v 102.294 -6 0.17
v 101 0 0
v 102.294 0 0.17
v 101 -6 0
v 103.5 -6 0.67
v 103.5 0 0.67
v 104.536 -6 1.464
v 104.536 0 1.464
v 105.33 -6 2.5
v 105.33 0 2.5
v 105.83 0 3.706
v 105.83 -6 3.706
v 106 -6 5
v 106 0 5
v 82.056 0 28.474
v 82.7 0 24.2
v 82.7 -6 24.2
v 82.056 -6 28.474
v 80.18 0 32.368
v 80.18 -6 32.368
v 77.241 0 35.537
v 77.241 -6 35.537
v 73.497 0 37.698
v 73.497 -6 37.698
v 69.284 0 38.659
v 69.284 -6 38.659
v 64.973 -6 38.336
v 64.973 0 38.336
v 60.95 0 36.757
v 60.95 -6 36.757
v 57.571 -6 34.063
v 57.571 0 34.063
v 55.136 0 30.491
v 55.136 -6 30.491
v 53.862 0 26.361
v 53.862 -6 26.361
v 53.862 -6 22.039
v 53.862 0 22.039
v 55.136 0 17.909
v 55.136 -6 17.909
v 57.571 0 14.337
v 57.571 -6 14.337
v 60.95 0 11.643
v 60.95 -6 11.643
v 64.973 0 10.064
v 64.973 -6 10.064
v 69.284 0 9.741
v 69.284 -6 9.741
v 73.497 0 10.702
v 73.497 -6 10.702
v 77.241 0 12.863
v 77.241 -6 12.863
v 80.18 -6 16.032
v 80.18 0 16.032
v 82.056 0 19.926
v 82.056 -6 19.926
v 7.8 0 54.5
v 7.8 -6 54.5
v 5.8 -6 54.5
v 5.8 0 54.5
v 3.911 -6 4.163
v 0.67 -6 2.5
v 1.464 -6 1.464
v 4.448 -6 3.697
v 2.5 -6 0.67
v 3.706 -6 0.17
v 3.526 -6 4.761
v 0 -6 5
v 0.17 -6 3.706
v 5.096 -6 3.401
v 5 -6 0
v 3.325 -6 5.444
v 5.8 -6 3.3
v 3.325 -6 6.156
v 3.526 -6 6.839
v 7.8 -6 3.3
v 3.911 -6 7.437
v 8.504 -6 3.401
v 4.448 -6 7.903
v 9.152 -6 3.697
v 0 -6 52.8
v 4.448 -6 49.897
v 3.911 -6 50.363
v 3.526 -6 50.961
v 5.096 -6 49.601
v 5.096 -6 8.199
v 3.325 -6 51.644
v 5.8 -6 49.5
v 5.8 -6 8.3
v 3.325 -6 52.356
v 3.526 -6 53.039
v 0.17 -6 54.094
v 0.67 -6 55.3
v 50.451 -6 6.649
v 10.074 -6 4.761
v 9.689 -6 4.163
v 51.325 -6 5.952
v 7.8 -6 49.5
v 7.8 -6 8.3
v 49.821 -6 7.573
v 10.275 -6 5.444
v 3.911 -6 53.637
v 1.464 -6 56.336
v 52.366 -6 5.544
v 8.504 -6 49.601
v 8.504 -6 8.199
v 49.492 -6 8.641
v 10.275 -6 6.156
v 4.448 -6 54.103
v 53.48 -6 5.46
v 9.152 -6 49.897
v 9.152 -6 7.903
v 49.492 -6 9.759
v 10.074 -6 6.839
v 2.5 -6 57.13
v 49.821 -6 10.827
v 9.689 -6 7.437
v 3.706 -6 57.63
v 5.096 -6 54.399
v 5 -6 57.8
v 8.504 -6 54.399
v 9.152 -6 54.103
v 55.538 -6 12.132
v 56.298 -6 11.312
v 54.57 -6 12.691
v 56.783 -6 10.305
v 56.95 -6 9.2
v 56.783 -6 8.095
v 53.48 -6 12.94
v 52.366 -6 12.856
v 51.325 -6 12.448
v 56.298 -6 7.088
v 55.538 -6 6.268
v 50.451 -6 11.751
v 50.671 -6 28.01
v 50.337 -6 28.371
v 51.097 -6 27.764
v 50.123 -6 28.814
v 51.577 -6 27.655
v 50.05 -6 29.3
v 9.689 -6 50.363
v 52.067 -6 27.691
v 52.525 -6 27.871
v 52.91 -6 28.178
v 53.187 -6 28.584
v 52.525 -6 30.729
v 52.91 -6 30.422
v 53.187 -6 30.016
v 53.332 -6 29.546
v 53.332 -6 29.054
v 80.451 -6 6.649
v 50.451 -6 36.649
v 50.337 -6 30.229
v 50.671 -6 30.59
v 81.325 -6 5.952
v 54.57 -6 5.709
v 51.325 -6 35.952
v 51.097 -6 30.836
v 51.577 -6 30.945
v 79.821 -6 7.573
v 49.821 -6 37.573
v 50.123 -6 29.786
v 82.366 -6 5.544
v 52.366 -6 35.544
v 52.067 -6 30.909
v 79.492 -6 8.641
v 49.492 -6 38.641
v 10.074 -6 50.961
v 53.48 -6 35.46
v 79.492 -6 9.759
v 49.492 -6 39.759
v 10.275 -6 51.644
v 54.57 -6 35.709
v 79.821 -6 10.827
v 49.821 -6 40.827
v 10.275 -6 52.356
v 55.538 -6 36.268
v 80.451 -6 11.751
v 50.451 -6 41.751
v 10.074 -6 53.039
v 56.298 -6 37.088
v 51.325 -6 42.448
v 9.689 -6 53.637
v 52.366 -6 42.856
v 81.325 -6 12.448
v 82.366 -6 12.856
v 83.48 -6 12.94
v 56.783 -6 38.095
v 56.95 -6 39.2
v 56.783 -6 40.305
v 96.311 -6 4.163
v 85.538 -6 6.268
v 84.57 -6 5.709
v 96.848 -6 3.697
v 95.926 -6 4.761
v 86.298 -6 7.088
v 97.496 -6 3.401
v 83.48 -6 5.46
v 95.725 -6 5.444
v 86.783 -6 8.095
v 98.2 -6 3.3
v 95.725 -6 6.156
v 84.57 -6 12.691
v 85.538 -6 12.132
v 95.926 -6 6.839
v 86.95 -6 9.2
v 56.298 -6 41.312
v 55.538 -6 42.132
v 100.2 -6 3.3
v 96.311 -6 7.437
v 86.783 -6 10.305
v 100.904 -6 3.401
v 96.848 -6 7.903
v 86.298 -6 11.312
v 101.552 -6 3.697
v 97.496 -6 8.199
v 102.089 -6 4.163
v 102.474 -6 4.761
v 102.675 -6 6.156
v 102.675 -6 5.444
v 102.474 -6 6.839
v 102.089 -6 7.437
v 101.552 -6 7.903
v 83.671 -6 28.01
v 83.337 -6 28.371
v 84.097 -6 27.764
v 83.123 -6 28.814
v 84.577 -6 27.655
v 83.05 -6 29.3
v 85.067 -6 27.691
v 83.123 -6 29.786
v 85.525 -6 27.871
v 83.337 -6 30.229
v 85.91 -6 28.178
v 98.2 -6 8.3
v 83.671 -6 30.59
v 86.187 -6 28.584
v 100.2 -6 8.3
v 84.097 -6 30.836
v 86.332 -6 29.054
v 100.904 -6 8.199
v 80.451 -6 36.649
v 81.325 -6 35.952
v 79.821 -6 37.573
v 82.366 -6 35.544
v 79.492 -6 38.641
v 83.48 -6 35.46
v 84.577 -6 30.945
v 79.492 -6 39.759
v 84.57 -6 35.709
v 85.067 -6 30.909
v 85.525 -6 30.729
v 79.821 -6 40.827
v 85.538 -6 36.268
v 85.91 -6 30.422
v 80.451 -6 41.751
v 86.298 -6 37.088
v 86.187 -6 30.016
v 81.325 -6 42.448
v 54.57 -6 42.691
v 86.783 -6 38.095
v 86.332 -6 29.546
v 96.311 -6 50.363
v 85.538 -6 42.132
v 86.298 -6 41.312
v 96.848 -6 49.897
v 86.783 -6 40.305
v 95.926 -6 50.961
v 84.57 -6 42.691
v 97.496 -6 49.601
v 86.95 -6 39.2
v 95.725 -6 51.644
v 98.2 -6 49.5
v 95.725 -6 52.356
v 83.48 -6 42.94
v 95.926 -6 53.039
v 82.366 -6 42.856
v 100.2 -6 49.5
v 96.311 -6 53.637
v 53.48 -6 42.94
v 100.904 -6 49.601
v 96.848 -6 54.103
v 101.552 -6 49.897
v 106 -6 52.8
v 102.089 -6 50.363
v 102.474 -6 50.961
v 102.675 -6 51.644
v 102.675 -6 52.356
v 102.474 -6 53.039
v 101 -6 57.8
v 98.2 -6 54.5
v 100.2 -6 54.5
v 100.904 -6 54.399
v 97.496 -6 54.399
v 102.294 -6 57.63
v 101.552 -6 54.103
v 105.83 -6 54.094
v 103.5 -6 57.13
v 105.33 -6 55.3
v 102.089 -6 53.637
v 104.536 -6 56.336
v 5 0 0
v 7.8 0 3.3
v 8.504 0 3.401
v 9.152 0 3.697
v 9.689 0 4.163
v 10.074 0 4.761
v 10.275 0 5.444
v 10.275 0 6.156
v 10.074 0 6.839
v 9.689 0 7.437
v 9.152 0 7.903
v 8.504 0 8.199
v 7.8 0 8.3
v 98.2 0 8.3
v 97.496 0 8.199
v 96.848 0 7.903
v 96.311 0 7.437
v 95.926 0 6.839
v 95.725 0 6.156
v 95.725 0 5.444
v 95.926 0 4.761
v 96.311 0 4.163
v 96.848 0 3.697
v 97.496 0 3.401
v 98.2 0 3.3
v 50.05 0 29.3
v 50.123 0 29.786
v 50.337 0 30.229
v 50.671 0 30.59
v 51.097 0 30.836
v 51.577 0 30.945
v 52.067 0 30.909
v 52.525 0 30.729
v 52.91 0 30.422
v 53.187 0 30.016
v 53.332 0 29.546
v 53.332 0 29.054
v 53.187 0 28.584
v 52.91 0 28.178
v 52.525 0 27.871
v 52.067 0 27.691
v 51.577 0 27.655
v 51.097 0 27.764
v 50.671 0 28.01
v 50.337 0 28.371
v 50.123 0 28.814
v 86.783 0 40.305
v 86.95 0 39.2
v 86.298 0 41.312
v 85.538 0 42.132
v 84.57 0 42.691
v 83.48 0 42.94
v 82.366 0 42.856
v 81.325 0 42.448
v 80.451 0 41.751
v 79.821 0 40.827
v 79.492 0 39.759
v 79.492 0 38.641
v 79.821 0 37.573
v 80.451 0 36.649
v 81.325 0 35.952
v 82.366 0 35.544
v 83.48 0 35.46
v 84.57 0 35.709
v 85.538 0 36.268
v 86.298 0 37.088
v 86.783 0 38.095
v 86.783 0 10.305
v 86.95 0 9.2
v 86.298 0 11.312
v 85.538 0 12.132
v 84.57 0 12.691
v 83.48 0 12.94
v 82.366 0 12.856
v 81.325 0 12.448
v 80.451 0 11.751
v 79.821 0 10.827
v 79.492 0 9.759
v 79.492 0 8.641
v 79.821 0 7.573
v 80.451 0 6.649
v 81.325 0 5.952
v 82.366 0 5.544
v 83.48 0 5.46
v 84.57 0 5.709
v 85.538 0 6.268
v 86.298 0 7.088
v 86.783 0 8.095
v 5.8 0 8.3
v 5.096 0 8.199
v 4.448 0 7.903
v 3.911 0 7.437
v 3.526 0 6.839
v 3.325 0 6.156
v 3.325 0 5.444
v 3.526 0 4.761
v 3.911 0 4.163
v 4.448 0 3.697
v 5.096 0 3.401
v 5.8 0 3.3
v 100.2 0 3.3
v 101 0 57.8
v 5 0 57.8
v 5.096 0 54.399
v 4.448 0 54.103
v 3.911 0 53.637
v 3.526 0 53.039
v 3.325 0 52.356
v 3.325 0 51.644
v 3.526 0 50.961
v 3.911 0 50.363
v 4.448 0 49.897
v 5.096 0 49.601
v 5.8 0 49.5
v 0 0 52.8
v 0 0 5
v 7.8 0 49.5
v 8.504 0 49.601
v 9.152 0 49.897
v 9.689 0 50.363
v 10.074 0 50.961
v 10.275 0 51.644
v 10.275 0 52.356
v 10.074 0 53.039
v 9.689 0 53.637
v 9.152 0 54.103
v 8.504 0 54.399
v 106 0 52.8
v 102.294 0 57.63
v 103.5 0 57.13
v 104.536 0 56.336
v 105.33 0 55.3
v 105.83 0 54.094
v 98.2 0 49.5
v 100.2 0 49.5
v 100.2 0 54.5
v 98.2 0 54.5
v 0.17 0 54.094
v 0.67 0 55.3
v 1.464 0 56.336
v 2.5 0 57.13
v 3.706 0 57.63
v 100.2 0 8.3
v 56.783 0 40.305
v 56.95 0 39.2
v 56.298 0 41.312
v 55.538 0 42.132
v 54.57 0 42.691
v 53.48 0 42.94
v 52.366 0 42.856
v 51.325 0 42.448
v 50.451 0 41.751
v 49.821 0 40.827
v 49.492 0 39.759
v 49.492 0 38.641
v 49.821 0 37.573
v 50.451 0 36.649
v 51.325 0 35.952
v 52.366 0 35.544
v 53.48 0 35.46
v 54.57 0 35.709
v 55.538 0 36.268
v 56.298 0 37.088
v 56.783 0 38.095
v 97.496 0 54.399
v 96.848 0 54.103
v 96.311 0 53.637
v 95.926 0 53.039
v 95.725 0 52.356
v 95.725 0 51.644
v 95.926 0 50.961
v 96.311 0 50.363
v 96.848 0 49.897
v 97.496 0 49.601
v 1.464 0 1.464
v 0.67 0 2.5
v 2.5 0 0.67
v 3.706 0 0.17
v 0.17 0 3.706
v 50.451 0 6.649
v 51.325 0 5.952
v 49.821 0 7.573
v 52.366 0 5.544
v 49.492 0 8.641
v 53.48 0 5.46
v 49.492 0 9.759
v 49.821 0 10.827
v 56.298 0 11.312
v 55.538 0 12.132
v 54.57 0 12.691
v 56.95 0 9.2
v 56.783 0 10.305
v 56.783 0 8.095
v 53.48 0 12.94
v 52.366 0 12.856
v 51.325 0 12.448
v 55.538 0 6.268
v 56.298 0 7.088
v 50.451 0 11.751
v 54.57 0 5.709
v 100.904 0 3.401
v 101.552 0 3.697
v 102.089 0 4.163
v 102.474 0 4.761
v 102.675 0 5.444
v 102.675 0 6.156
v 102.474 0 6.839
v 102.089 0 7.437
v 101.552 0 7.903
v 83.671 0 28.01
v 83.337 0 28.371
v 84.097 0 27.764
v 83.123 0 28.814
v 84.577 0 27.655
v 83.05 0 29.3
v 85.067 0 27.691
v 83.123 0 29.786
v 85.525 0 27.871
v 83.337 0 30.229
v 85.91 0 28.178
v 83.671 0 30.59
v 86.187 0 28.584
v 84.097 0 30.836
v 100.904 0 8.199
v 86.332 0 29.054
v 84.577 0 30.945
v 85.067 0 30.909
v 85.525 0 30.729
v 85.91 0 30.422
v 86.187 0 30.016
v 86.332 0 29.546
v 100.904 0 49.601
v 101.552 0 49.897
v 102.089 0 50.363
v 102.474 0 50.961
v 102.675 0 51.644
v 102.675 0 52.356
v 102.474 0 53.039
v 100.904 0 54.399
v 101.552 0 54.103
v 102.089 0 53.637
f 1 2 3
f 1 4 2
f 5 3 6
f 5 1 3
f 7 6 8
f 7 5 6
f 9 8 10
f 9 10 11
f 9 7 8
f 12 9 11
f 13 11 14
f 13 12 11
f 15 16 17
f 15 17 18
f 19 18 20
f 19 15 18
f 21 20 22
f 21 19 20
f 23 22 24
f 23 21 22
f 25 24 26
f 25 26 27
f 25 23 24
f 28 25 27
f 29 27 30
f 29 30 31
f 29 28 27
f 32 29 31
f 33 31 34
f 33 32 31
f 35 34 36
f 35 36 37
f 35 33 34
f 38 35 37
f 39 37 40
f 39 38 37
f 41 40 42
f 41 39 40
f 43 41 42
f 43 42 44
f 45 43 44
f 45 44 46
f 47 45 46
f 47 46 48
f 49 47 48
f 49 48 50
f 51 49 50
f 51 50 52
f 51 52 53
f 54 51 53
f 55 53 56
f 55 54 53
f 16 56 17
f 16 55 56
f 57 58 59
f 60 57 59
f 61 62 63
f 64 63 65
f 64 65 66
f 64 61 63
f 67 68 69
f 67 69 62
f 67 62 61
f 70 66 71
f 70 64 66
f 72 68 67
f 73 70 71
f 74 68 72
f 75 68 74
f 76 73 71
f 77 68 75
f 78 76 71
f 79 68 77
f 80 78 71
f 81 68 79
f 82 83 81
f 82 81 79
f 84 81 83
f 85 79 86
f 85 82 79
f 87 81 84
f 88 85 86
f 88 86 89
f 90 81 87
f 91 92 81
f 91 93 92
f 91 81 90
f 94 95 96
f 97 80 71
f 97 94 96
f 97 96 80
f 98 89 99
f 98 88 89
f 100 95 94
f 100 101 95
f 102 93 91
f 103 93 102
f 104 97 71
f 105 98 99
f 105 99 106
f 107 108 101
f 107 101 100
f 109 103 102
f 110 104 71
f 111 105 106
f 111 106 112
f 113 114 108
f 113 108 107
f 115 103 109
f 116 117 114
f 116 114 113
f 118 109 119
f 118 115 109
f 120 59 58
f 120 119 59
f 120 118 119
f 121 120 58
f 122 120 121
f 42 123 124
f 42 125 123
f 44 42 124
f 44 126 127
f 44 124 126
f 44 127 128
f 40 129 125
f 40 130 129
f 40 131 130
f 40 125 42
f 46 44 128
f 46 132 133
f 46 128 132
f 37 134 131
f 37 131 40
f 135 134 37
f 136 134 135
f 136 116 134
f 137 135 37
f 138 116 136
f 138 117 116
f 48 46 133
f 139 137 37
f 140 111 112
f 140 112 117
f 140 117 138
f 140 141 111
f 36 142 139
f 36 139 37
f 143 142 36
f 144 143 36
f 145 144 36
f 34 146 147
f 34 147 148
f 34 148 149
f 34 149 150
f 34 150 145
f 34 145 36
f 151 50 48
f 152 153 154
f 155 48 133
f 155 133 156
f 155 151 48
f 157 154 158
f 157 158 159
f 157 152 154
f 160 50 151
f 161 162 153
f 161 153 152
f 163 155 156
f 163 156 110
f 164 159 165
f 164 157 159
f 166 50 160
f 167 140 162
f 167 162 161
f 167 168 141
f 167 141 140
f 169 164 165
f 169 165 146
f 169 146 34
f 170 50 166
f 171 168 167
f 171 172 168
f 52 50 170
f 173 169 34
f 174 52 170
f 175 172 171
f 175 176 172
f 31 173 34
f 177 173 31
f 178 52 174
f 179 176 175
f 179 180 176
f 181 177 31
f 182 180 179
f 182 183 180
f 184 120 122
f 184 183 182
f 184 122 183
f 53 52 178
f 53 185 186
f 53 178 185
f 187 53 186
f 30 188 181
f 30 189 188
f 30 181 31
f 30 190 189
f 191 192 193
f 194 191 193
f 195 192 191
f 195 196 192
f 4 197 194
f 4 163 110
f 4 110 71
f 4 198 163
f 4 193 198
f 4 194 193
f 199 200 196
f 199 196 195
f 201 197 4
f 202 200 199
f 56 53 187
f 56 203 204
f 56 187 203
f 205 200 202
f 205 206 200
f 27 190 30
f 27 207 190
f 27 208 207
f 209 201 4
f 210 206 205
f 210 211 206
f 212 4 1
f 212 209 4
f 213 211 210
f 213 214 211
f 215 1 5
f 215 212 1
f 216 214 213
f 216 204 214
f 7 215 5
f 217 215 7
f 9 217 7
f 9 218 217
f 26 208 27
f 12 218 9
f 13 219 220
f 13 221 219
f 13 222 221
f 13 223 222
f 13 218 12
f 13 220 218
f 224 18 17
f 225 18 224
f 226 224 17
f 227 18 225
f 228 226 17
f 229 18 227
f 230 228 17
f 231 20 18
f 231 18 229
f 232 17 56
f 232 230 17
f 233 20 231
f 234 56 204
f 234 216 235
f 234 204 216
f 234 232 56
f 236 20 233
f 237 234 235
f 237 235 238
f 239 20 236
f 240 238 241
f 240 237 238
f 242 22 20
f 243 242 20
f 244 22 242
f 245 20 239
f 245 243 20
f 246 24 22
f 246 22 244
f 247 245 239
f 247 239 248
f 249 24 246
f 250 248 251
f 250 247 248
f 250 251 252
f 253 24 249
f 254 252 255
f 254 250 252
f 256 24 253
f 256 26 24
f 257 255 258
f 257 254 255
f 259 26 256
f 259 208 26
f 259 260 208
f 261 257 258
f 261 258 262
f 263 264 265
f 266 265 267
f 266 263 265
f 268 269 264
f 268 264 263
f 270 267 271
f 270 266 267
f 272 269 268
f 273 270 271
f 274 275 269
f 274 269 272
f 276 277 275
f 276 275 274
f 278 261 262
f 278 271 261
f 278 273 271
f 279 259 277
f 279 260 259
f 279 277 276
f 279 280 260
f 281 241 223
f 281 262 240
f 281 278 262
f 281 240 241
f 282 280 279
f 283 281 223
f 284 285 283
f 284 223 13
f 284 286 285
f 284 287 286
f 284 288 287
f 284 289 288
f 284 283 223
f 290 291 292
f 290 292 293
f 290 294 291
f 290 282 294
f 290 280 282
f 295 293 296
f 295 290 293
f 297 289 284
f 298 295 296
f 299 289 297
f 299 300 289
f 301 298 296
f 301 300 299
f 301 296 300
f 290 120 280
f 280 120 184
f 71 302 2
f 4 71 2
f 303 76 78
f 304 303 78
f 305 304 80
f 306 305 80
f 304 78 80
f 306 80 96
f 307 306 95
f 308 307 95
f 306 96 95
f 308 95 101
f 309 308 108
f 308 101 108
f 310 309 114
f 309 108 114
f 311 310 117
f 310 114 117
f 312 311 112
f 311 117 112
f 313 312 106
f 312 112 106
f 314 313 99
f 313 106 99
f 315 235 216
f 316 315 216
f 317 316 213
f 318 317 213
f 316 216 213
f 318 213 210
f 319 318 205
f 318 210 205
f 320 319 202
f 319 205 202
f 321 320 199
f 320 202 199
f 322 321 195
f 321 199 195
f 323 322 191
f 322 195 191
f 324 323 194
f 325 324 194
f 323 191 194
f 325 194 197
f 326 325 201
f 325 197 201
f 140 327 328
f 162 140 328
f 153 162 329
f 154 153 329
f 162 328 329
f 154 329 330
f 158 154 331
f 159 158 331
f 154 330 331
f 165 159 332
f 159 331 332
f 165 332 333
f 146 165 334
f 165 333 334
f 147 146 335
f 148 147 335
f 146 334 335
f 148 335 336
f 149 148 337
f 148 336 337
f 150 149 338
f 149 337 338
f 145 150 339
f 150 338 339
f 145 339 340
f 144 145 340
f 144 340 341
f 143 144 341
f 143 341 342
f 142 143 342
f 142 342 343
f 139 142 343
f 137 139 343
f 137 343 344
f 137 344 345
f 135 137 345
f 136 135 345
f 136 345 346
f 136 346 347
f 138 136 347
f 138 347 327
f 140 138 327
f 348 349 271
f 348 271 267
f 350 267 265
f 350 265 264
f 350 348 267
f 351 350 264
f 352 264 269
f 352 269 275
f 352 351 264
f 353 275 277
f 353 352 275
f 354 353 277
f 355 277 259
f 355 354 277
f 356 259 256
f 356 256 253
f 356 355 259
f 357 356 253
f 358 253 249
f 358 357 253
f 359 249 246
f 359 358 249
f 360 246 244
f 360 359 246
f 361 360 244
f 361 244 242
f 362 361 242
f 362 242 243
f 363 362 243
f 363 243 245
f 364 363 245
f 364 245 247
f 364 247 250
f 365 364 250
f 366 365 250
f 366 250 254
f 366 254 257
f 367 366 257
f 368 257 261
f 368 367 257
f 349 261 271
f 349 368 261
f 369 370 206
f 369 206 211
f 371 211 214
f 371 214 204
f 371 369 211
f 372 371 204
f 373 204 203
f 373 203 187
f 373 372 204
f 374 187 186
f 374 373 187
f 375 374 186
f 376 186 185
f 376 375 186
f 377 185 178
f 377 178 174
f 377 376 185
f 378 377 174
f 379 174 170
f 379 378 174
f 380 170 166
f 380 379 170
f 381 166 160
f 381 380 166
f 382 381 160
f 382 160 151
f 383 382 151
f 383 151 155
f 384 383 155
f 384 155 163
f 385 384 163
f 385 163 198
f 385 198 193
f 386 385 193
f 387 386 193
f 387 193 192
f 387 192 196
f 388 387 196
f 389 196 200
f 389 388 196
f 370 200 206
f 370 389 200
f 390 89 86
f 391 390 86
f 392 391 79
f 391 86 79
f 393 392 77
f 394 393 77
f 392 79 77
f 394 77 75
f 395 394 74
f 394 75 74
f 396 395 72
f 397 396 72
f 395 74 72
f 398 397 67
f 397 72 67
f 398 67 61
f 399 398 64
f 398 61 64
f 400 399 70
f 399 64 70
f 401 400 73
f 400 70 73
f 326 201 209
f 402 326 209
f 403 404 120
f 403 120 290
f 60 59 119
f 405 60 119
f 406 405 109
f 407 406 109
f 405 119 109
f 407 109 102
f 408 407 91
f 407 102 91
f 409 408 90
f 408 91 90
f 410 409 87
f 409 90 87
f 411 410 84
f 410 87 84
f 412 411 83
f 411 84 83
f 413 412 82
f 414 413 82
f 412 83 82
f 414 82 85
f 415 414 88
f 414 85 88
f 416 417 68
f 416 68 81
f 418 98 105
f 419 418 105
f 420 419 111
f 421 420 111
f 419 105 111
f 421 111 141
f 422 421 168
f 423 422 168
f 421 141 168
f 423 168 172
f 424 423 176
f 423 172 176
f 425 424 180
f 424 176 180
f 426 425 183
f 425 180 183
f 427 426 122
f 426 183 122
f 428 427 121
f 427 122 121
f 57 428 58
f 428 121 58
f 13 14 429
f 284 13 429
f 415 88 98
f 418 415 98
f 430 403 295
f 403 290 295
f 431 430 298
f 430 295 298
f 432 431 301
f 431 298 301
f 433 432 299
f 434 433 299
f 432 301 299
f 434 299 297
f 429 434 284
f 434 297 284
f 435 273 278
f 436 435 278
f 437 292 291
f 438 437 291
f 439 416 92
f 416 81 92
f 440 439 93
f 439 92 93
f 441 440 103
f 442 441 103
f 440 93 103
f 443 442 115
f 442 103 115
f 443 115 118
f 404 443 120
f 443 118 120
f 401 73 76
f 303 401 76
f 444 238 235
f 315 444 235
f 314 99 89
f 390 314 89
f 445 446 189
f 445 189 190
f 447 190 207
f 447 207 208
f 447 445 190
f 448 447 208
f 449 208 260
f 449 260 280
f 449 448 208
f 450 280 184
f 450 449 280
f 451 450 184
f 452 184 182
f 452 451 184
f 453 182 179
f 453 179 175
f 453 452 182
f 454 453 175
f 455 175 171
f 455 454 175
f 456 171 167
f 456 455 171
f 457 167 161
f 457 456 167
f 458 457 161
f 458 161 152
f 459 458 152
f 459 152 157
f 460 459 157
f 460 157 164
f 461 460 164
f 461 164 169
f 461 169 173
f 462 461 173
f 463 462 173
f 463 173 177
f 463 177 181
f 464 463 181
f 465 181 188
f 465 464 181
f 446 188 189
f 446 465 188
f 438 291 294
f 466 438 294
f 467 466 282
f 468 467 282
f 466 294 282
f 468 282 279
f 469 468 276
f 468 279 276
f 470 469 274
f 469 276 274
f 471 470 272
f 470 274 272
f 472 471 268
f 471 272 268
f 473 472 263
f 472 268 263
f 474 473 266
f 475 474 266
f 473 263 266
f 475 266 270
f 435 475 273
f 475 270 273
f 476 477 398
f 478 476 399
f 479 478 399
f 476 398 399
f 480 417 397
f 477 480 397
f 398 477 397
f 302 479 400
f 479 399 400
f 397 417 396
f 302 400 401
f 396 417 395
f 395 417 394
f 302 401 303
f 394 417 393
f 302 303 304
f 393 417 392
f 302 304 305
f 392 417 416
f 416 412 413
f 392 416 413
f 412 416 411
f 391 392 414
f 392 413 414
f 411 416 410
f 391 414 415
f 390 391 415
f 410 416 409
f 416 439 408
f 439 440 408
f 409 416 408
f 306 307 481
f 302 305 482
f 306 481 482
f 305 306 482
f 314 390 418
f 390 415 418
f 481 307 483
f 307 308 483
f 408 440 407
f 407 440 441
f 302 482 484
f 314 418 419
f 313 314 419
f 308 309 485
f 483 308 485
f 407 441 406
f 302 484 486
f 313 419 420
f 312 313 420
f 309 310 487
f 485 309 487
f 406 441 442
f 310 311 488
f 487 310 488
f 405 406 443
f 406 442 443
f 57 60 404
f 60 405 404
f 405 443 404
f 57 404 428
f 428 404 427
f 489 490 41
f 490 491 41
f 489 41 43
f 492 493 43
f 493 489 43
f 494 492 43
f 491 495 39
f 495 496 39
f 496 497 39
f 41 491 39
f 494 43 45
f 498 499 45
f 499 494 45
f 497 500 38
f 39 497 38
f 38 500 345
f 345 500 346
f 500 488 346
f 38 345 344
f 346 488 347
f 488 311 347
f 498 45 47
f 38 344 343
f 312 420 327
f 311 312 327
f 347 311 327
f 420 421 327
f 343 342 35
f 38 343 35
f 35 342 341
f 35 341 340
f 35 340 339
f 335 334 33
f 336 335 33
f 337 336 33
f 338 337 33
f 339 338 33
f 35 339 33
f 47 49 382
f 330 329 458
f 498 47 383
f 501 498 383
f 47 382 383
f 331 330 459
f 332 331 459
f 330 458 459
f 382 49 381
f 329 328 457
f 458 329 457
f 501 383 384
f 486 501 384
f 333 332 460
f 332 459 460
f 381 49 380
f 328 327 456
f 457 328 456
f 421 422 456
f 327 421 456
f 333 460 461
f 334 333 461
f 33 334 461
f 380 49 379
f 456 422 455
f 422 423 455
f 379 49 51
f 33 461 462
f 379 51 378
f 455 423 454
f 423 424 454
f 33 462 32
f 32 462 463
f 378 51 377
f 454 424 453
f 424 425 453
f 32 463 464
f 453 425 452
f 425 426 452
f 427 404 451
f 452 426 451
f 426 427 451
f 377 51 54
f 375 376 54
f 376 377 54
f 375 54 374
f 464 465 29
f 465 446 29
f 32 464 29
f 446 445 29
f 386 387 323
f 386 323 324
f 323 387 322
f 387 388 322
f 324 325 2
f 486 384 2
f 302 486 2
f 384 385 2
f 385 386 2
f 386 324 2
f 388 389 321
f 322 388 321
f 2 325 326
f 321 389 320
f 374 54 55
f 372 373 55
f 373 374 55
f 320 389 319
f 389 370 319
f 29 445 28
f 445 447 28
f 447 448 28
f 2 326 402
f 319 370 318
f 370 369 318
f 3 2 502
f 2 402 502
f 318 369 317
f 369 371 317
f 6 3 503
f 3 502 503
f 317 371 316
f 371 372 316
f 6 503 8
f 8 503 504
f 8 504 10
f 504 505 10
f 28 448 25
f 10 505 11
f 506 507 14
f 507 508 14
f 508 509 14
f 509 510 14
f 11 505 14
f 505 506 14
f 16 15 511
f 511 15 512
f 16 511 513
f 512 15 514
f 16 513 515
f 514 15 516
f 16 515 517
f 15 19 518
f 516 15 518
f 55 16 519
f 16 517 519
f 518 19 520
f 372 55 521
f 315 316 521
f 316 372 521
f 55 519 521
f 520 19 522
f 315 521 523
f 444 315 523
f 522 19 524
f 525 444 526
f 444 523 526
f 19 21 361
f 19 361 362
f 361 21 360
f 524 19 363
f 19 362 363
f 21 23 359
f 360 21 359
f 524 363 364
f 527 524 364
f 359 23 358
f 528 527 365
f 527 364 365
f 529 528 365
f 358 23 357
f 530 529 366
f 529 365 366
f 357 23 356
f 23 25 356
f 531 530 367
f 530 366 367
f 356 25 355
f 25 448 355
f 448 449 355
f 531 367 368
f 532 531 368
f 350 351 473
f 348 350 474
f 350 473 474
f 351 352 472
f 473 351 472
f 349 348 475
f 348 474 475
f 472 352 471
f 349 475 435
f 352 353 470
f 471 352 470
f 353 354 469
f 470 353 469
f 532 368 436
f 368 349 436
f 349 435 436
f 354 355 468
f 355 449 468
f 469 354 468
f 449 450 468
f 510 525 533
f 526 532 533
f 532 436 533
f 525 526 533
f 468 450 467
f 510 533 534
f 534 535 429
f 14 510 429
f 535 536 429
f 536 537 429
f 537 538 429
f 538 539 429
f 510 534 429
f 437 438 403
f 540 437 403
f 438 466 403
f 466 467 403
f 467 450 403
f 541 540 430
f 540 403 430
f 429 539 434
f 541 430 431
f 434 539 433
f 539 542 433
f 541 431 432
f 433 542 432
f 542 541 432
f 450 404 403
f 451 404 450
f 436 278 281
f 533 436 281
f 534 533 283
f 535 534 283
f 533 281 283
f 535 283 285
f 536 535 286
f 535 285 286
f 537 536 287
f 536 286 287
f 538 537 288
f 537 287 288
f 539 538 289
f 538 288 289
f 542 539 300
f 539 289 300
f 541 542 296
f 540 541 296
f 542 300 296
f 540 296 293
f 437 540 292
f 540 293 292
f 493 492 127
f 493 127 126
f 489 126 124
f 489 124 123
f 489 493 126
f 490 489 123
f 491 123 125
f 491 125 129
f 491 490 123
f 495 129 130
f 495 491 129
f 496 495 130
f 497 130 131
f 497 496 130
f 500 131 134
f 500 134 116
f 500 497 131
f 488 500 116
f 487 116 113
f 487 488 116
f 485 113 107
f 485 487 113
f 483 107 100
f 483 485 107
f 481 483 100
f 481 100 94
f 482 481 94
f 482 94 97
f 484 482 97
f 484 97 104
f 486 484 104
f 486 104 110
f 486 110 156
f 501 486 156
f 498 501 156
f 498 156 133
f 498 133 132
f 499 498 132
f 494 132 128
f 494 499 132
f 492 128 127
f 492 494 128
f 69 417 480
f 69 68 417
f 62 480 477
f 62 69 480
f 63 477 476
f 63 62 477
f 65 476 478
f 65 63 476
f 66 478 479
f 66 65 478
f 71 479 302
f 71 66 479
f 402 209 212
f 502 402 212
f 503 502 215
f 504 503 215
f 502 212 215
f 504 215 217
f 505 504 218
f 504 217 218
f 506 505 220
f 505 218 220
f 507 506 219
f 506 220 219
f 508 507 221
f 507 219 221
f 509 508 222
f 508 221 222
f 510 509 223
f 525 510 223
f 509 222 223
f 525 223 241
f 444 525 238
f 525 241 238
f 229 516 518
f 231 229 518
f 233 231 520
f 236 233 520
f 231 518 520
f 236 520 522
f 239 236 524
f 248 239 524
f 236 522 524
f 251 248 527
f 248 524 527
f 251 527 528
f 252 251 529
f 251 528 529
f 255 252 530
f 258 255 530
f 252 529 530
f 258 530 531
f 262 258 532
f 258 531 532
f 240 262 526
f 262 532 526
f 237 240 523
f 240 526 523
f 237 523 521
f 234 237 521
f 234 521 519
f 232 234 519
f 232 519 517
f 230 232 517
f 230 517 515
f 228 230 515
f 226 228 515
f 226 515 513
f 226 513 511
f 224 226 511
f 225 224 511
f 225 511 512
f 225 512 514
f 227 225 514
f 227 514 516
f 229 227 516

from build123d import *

# Parameters (mm, degrees)
F0_W     = 106
F0_H     = 57.8
F0_R     = 3.75
F0_R_2   = 14.5
F1_DEPTH = 6
F3_DEPTH = 6
F4_D     = 3.3
F5_R     = 5


with BuildPart() as f1:
    # F0 (on Front) → F1 (new body)
    with BuildSketch(Plane.XZ):
        with Locations((53, 28.9)):
            Rectangle(F0_W, F0_H)
        with Locations((53.2, 9.2)):
            Circle(F0_R, mode=Mode.SUBTRACT)
        with Locations((83.2, 9.2)):
            Circle(F0_R, mode=Mode.SUBTRACT)
        with Locations((68.2, 24.2)):
            Circle(F0_R_2, mode=Mode.SUBTRACT)
        with Locations((53.2, 39.2)):
            Circle(F0_R, mode=Mode.SUBTRACT)
        with Locations((83.2, 39.2)):
            Circle(F0_R, mode=Mode.SUBTRACT)
    extrude(amount=F1_DEPTH)

    # F2 (on face) → F3 (cut, through all)
    with BuildSketch(Plane.XZ.offset(6)):
        with BuildLine():
            Line((7.8, 54.5), (5.8, 54.5))
            ThreePointArc((5.8, 54.5), (3.3, 52), (5.8, 49.5))
            Line((5.8, 49.5), (7.8, 49.5))
            ThreePointArc((7.8, 49.5), (10.3, 52), (7.8, 54.5))
        make_face()
        with BuildLine():
            Line((7.8, 8.3), (5.8, 8.3))
            ThreePointArc((5.8, 8.3), (3.3, 5.8), (5.8, 3.3))
            Line((5.8, 3.3), (7.8, 3.3))
            ThreePointArc((7.8, 3.3), (10.3, 5.8), (7.8, 8.3))
        make_face()
        with BuildLine():
            Line((100.2, 8.3), (98.2, 8.3))
            ThreePointArc((98.2, 8.3), (95.7, 5.8), (98.2, 3.3))
            Line((98.2, 3.3), (100.2, 3.3))
            ThreePointArc((100.2, 3.3), (102.7, 5.8), (100.2, 8.3))
        make_face()
        with BuildLine():
            Line((100.2, 54.5), (98.2, 54.5))
            ThreePointArc((98.2, 54.5), (95.7, 52), (98.2, 49.5))
            Line((98.2, 49.5), (100.2, 49.5))
            ThreePointArc((100.2, 49.5), (102.7, 52), (100.2, 54.5))
        make_face()
    extrude(amount=-F3_DEPTH, mode=Mode.SUBTRACT)

    # F4 (through all)
    with Locations(Plane.XZ.offset(6)):
        with Locations((51.7, 29.3), (84.7, 29.3)):
            Hole(F4_D / 2)

    # F5
    f5_edges = [f1.edges().sort_by_distance(p)[0] for p in [
        (106, -3, 57.8),
        (106, -3, 0),
        (0, -3, 0),
        (0, -3, 57.8),
    ]]
    fillet(f5_edges, radius=F5_R)


solid = f1.part
